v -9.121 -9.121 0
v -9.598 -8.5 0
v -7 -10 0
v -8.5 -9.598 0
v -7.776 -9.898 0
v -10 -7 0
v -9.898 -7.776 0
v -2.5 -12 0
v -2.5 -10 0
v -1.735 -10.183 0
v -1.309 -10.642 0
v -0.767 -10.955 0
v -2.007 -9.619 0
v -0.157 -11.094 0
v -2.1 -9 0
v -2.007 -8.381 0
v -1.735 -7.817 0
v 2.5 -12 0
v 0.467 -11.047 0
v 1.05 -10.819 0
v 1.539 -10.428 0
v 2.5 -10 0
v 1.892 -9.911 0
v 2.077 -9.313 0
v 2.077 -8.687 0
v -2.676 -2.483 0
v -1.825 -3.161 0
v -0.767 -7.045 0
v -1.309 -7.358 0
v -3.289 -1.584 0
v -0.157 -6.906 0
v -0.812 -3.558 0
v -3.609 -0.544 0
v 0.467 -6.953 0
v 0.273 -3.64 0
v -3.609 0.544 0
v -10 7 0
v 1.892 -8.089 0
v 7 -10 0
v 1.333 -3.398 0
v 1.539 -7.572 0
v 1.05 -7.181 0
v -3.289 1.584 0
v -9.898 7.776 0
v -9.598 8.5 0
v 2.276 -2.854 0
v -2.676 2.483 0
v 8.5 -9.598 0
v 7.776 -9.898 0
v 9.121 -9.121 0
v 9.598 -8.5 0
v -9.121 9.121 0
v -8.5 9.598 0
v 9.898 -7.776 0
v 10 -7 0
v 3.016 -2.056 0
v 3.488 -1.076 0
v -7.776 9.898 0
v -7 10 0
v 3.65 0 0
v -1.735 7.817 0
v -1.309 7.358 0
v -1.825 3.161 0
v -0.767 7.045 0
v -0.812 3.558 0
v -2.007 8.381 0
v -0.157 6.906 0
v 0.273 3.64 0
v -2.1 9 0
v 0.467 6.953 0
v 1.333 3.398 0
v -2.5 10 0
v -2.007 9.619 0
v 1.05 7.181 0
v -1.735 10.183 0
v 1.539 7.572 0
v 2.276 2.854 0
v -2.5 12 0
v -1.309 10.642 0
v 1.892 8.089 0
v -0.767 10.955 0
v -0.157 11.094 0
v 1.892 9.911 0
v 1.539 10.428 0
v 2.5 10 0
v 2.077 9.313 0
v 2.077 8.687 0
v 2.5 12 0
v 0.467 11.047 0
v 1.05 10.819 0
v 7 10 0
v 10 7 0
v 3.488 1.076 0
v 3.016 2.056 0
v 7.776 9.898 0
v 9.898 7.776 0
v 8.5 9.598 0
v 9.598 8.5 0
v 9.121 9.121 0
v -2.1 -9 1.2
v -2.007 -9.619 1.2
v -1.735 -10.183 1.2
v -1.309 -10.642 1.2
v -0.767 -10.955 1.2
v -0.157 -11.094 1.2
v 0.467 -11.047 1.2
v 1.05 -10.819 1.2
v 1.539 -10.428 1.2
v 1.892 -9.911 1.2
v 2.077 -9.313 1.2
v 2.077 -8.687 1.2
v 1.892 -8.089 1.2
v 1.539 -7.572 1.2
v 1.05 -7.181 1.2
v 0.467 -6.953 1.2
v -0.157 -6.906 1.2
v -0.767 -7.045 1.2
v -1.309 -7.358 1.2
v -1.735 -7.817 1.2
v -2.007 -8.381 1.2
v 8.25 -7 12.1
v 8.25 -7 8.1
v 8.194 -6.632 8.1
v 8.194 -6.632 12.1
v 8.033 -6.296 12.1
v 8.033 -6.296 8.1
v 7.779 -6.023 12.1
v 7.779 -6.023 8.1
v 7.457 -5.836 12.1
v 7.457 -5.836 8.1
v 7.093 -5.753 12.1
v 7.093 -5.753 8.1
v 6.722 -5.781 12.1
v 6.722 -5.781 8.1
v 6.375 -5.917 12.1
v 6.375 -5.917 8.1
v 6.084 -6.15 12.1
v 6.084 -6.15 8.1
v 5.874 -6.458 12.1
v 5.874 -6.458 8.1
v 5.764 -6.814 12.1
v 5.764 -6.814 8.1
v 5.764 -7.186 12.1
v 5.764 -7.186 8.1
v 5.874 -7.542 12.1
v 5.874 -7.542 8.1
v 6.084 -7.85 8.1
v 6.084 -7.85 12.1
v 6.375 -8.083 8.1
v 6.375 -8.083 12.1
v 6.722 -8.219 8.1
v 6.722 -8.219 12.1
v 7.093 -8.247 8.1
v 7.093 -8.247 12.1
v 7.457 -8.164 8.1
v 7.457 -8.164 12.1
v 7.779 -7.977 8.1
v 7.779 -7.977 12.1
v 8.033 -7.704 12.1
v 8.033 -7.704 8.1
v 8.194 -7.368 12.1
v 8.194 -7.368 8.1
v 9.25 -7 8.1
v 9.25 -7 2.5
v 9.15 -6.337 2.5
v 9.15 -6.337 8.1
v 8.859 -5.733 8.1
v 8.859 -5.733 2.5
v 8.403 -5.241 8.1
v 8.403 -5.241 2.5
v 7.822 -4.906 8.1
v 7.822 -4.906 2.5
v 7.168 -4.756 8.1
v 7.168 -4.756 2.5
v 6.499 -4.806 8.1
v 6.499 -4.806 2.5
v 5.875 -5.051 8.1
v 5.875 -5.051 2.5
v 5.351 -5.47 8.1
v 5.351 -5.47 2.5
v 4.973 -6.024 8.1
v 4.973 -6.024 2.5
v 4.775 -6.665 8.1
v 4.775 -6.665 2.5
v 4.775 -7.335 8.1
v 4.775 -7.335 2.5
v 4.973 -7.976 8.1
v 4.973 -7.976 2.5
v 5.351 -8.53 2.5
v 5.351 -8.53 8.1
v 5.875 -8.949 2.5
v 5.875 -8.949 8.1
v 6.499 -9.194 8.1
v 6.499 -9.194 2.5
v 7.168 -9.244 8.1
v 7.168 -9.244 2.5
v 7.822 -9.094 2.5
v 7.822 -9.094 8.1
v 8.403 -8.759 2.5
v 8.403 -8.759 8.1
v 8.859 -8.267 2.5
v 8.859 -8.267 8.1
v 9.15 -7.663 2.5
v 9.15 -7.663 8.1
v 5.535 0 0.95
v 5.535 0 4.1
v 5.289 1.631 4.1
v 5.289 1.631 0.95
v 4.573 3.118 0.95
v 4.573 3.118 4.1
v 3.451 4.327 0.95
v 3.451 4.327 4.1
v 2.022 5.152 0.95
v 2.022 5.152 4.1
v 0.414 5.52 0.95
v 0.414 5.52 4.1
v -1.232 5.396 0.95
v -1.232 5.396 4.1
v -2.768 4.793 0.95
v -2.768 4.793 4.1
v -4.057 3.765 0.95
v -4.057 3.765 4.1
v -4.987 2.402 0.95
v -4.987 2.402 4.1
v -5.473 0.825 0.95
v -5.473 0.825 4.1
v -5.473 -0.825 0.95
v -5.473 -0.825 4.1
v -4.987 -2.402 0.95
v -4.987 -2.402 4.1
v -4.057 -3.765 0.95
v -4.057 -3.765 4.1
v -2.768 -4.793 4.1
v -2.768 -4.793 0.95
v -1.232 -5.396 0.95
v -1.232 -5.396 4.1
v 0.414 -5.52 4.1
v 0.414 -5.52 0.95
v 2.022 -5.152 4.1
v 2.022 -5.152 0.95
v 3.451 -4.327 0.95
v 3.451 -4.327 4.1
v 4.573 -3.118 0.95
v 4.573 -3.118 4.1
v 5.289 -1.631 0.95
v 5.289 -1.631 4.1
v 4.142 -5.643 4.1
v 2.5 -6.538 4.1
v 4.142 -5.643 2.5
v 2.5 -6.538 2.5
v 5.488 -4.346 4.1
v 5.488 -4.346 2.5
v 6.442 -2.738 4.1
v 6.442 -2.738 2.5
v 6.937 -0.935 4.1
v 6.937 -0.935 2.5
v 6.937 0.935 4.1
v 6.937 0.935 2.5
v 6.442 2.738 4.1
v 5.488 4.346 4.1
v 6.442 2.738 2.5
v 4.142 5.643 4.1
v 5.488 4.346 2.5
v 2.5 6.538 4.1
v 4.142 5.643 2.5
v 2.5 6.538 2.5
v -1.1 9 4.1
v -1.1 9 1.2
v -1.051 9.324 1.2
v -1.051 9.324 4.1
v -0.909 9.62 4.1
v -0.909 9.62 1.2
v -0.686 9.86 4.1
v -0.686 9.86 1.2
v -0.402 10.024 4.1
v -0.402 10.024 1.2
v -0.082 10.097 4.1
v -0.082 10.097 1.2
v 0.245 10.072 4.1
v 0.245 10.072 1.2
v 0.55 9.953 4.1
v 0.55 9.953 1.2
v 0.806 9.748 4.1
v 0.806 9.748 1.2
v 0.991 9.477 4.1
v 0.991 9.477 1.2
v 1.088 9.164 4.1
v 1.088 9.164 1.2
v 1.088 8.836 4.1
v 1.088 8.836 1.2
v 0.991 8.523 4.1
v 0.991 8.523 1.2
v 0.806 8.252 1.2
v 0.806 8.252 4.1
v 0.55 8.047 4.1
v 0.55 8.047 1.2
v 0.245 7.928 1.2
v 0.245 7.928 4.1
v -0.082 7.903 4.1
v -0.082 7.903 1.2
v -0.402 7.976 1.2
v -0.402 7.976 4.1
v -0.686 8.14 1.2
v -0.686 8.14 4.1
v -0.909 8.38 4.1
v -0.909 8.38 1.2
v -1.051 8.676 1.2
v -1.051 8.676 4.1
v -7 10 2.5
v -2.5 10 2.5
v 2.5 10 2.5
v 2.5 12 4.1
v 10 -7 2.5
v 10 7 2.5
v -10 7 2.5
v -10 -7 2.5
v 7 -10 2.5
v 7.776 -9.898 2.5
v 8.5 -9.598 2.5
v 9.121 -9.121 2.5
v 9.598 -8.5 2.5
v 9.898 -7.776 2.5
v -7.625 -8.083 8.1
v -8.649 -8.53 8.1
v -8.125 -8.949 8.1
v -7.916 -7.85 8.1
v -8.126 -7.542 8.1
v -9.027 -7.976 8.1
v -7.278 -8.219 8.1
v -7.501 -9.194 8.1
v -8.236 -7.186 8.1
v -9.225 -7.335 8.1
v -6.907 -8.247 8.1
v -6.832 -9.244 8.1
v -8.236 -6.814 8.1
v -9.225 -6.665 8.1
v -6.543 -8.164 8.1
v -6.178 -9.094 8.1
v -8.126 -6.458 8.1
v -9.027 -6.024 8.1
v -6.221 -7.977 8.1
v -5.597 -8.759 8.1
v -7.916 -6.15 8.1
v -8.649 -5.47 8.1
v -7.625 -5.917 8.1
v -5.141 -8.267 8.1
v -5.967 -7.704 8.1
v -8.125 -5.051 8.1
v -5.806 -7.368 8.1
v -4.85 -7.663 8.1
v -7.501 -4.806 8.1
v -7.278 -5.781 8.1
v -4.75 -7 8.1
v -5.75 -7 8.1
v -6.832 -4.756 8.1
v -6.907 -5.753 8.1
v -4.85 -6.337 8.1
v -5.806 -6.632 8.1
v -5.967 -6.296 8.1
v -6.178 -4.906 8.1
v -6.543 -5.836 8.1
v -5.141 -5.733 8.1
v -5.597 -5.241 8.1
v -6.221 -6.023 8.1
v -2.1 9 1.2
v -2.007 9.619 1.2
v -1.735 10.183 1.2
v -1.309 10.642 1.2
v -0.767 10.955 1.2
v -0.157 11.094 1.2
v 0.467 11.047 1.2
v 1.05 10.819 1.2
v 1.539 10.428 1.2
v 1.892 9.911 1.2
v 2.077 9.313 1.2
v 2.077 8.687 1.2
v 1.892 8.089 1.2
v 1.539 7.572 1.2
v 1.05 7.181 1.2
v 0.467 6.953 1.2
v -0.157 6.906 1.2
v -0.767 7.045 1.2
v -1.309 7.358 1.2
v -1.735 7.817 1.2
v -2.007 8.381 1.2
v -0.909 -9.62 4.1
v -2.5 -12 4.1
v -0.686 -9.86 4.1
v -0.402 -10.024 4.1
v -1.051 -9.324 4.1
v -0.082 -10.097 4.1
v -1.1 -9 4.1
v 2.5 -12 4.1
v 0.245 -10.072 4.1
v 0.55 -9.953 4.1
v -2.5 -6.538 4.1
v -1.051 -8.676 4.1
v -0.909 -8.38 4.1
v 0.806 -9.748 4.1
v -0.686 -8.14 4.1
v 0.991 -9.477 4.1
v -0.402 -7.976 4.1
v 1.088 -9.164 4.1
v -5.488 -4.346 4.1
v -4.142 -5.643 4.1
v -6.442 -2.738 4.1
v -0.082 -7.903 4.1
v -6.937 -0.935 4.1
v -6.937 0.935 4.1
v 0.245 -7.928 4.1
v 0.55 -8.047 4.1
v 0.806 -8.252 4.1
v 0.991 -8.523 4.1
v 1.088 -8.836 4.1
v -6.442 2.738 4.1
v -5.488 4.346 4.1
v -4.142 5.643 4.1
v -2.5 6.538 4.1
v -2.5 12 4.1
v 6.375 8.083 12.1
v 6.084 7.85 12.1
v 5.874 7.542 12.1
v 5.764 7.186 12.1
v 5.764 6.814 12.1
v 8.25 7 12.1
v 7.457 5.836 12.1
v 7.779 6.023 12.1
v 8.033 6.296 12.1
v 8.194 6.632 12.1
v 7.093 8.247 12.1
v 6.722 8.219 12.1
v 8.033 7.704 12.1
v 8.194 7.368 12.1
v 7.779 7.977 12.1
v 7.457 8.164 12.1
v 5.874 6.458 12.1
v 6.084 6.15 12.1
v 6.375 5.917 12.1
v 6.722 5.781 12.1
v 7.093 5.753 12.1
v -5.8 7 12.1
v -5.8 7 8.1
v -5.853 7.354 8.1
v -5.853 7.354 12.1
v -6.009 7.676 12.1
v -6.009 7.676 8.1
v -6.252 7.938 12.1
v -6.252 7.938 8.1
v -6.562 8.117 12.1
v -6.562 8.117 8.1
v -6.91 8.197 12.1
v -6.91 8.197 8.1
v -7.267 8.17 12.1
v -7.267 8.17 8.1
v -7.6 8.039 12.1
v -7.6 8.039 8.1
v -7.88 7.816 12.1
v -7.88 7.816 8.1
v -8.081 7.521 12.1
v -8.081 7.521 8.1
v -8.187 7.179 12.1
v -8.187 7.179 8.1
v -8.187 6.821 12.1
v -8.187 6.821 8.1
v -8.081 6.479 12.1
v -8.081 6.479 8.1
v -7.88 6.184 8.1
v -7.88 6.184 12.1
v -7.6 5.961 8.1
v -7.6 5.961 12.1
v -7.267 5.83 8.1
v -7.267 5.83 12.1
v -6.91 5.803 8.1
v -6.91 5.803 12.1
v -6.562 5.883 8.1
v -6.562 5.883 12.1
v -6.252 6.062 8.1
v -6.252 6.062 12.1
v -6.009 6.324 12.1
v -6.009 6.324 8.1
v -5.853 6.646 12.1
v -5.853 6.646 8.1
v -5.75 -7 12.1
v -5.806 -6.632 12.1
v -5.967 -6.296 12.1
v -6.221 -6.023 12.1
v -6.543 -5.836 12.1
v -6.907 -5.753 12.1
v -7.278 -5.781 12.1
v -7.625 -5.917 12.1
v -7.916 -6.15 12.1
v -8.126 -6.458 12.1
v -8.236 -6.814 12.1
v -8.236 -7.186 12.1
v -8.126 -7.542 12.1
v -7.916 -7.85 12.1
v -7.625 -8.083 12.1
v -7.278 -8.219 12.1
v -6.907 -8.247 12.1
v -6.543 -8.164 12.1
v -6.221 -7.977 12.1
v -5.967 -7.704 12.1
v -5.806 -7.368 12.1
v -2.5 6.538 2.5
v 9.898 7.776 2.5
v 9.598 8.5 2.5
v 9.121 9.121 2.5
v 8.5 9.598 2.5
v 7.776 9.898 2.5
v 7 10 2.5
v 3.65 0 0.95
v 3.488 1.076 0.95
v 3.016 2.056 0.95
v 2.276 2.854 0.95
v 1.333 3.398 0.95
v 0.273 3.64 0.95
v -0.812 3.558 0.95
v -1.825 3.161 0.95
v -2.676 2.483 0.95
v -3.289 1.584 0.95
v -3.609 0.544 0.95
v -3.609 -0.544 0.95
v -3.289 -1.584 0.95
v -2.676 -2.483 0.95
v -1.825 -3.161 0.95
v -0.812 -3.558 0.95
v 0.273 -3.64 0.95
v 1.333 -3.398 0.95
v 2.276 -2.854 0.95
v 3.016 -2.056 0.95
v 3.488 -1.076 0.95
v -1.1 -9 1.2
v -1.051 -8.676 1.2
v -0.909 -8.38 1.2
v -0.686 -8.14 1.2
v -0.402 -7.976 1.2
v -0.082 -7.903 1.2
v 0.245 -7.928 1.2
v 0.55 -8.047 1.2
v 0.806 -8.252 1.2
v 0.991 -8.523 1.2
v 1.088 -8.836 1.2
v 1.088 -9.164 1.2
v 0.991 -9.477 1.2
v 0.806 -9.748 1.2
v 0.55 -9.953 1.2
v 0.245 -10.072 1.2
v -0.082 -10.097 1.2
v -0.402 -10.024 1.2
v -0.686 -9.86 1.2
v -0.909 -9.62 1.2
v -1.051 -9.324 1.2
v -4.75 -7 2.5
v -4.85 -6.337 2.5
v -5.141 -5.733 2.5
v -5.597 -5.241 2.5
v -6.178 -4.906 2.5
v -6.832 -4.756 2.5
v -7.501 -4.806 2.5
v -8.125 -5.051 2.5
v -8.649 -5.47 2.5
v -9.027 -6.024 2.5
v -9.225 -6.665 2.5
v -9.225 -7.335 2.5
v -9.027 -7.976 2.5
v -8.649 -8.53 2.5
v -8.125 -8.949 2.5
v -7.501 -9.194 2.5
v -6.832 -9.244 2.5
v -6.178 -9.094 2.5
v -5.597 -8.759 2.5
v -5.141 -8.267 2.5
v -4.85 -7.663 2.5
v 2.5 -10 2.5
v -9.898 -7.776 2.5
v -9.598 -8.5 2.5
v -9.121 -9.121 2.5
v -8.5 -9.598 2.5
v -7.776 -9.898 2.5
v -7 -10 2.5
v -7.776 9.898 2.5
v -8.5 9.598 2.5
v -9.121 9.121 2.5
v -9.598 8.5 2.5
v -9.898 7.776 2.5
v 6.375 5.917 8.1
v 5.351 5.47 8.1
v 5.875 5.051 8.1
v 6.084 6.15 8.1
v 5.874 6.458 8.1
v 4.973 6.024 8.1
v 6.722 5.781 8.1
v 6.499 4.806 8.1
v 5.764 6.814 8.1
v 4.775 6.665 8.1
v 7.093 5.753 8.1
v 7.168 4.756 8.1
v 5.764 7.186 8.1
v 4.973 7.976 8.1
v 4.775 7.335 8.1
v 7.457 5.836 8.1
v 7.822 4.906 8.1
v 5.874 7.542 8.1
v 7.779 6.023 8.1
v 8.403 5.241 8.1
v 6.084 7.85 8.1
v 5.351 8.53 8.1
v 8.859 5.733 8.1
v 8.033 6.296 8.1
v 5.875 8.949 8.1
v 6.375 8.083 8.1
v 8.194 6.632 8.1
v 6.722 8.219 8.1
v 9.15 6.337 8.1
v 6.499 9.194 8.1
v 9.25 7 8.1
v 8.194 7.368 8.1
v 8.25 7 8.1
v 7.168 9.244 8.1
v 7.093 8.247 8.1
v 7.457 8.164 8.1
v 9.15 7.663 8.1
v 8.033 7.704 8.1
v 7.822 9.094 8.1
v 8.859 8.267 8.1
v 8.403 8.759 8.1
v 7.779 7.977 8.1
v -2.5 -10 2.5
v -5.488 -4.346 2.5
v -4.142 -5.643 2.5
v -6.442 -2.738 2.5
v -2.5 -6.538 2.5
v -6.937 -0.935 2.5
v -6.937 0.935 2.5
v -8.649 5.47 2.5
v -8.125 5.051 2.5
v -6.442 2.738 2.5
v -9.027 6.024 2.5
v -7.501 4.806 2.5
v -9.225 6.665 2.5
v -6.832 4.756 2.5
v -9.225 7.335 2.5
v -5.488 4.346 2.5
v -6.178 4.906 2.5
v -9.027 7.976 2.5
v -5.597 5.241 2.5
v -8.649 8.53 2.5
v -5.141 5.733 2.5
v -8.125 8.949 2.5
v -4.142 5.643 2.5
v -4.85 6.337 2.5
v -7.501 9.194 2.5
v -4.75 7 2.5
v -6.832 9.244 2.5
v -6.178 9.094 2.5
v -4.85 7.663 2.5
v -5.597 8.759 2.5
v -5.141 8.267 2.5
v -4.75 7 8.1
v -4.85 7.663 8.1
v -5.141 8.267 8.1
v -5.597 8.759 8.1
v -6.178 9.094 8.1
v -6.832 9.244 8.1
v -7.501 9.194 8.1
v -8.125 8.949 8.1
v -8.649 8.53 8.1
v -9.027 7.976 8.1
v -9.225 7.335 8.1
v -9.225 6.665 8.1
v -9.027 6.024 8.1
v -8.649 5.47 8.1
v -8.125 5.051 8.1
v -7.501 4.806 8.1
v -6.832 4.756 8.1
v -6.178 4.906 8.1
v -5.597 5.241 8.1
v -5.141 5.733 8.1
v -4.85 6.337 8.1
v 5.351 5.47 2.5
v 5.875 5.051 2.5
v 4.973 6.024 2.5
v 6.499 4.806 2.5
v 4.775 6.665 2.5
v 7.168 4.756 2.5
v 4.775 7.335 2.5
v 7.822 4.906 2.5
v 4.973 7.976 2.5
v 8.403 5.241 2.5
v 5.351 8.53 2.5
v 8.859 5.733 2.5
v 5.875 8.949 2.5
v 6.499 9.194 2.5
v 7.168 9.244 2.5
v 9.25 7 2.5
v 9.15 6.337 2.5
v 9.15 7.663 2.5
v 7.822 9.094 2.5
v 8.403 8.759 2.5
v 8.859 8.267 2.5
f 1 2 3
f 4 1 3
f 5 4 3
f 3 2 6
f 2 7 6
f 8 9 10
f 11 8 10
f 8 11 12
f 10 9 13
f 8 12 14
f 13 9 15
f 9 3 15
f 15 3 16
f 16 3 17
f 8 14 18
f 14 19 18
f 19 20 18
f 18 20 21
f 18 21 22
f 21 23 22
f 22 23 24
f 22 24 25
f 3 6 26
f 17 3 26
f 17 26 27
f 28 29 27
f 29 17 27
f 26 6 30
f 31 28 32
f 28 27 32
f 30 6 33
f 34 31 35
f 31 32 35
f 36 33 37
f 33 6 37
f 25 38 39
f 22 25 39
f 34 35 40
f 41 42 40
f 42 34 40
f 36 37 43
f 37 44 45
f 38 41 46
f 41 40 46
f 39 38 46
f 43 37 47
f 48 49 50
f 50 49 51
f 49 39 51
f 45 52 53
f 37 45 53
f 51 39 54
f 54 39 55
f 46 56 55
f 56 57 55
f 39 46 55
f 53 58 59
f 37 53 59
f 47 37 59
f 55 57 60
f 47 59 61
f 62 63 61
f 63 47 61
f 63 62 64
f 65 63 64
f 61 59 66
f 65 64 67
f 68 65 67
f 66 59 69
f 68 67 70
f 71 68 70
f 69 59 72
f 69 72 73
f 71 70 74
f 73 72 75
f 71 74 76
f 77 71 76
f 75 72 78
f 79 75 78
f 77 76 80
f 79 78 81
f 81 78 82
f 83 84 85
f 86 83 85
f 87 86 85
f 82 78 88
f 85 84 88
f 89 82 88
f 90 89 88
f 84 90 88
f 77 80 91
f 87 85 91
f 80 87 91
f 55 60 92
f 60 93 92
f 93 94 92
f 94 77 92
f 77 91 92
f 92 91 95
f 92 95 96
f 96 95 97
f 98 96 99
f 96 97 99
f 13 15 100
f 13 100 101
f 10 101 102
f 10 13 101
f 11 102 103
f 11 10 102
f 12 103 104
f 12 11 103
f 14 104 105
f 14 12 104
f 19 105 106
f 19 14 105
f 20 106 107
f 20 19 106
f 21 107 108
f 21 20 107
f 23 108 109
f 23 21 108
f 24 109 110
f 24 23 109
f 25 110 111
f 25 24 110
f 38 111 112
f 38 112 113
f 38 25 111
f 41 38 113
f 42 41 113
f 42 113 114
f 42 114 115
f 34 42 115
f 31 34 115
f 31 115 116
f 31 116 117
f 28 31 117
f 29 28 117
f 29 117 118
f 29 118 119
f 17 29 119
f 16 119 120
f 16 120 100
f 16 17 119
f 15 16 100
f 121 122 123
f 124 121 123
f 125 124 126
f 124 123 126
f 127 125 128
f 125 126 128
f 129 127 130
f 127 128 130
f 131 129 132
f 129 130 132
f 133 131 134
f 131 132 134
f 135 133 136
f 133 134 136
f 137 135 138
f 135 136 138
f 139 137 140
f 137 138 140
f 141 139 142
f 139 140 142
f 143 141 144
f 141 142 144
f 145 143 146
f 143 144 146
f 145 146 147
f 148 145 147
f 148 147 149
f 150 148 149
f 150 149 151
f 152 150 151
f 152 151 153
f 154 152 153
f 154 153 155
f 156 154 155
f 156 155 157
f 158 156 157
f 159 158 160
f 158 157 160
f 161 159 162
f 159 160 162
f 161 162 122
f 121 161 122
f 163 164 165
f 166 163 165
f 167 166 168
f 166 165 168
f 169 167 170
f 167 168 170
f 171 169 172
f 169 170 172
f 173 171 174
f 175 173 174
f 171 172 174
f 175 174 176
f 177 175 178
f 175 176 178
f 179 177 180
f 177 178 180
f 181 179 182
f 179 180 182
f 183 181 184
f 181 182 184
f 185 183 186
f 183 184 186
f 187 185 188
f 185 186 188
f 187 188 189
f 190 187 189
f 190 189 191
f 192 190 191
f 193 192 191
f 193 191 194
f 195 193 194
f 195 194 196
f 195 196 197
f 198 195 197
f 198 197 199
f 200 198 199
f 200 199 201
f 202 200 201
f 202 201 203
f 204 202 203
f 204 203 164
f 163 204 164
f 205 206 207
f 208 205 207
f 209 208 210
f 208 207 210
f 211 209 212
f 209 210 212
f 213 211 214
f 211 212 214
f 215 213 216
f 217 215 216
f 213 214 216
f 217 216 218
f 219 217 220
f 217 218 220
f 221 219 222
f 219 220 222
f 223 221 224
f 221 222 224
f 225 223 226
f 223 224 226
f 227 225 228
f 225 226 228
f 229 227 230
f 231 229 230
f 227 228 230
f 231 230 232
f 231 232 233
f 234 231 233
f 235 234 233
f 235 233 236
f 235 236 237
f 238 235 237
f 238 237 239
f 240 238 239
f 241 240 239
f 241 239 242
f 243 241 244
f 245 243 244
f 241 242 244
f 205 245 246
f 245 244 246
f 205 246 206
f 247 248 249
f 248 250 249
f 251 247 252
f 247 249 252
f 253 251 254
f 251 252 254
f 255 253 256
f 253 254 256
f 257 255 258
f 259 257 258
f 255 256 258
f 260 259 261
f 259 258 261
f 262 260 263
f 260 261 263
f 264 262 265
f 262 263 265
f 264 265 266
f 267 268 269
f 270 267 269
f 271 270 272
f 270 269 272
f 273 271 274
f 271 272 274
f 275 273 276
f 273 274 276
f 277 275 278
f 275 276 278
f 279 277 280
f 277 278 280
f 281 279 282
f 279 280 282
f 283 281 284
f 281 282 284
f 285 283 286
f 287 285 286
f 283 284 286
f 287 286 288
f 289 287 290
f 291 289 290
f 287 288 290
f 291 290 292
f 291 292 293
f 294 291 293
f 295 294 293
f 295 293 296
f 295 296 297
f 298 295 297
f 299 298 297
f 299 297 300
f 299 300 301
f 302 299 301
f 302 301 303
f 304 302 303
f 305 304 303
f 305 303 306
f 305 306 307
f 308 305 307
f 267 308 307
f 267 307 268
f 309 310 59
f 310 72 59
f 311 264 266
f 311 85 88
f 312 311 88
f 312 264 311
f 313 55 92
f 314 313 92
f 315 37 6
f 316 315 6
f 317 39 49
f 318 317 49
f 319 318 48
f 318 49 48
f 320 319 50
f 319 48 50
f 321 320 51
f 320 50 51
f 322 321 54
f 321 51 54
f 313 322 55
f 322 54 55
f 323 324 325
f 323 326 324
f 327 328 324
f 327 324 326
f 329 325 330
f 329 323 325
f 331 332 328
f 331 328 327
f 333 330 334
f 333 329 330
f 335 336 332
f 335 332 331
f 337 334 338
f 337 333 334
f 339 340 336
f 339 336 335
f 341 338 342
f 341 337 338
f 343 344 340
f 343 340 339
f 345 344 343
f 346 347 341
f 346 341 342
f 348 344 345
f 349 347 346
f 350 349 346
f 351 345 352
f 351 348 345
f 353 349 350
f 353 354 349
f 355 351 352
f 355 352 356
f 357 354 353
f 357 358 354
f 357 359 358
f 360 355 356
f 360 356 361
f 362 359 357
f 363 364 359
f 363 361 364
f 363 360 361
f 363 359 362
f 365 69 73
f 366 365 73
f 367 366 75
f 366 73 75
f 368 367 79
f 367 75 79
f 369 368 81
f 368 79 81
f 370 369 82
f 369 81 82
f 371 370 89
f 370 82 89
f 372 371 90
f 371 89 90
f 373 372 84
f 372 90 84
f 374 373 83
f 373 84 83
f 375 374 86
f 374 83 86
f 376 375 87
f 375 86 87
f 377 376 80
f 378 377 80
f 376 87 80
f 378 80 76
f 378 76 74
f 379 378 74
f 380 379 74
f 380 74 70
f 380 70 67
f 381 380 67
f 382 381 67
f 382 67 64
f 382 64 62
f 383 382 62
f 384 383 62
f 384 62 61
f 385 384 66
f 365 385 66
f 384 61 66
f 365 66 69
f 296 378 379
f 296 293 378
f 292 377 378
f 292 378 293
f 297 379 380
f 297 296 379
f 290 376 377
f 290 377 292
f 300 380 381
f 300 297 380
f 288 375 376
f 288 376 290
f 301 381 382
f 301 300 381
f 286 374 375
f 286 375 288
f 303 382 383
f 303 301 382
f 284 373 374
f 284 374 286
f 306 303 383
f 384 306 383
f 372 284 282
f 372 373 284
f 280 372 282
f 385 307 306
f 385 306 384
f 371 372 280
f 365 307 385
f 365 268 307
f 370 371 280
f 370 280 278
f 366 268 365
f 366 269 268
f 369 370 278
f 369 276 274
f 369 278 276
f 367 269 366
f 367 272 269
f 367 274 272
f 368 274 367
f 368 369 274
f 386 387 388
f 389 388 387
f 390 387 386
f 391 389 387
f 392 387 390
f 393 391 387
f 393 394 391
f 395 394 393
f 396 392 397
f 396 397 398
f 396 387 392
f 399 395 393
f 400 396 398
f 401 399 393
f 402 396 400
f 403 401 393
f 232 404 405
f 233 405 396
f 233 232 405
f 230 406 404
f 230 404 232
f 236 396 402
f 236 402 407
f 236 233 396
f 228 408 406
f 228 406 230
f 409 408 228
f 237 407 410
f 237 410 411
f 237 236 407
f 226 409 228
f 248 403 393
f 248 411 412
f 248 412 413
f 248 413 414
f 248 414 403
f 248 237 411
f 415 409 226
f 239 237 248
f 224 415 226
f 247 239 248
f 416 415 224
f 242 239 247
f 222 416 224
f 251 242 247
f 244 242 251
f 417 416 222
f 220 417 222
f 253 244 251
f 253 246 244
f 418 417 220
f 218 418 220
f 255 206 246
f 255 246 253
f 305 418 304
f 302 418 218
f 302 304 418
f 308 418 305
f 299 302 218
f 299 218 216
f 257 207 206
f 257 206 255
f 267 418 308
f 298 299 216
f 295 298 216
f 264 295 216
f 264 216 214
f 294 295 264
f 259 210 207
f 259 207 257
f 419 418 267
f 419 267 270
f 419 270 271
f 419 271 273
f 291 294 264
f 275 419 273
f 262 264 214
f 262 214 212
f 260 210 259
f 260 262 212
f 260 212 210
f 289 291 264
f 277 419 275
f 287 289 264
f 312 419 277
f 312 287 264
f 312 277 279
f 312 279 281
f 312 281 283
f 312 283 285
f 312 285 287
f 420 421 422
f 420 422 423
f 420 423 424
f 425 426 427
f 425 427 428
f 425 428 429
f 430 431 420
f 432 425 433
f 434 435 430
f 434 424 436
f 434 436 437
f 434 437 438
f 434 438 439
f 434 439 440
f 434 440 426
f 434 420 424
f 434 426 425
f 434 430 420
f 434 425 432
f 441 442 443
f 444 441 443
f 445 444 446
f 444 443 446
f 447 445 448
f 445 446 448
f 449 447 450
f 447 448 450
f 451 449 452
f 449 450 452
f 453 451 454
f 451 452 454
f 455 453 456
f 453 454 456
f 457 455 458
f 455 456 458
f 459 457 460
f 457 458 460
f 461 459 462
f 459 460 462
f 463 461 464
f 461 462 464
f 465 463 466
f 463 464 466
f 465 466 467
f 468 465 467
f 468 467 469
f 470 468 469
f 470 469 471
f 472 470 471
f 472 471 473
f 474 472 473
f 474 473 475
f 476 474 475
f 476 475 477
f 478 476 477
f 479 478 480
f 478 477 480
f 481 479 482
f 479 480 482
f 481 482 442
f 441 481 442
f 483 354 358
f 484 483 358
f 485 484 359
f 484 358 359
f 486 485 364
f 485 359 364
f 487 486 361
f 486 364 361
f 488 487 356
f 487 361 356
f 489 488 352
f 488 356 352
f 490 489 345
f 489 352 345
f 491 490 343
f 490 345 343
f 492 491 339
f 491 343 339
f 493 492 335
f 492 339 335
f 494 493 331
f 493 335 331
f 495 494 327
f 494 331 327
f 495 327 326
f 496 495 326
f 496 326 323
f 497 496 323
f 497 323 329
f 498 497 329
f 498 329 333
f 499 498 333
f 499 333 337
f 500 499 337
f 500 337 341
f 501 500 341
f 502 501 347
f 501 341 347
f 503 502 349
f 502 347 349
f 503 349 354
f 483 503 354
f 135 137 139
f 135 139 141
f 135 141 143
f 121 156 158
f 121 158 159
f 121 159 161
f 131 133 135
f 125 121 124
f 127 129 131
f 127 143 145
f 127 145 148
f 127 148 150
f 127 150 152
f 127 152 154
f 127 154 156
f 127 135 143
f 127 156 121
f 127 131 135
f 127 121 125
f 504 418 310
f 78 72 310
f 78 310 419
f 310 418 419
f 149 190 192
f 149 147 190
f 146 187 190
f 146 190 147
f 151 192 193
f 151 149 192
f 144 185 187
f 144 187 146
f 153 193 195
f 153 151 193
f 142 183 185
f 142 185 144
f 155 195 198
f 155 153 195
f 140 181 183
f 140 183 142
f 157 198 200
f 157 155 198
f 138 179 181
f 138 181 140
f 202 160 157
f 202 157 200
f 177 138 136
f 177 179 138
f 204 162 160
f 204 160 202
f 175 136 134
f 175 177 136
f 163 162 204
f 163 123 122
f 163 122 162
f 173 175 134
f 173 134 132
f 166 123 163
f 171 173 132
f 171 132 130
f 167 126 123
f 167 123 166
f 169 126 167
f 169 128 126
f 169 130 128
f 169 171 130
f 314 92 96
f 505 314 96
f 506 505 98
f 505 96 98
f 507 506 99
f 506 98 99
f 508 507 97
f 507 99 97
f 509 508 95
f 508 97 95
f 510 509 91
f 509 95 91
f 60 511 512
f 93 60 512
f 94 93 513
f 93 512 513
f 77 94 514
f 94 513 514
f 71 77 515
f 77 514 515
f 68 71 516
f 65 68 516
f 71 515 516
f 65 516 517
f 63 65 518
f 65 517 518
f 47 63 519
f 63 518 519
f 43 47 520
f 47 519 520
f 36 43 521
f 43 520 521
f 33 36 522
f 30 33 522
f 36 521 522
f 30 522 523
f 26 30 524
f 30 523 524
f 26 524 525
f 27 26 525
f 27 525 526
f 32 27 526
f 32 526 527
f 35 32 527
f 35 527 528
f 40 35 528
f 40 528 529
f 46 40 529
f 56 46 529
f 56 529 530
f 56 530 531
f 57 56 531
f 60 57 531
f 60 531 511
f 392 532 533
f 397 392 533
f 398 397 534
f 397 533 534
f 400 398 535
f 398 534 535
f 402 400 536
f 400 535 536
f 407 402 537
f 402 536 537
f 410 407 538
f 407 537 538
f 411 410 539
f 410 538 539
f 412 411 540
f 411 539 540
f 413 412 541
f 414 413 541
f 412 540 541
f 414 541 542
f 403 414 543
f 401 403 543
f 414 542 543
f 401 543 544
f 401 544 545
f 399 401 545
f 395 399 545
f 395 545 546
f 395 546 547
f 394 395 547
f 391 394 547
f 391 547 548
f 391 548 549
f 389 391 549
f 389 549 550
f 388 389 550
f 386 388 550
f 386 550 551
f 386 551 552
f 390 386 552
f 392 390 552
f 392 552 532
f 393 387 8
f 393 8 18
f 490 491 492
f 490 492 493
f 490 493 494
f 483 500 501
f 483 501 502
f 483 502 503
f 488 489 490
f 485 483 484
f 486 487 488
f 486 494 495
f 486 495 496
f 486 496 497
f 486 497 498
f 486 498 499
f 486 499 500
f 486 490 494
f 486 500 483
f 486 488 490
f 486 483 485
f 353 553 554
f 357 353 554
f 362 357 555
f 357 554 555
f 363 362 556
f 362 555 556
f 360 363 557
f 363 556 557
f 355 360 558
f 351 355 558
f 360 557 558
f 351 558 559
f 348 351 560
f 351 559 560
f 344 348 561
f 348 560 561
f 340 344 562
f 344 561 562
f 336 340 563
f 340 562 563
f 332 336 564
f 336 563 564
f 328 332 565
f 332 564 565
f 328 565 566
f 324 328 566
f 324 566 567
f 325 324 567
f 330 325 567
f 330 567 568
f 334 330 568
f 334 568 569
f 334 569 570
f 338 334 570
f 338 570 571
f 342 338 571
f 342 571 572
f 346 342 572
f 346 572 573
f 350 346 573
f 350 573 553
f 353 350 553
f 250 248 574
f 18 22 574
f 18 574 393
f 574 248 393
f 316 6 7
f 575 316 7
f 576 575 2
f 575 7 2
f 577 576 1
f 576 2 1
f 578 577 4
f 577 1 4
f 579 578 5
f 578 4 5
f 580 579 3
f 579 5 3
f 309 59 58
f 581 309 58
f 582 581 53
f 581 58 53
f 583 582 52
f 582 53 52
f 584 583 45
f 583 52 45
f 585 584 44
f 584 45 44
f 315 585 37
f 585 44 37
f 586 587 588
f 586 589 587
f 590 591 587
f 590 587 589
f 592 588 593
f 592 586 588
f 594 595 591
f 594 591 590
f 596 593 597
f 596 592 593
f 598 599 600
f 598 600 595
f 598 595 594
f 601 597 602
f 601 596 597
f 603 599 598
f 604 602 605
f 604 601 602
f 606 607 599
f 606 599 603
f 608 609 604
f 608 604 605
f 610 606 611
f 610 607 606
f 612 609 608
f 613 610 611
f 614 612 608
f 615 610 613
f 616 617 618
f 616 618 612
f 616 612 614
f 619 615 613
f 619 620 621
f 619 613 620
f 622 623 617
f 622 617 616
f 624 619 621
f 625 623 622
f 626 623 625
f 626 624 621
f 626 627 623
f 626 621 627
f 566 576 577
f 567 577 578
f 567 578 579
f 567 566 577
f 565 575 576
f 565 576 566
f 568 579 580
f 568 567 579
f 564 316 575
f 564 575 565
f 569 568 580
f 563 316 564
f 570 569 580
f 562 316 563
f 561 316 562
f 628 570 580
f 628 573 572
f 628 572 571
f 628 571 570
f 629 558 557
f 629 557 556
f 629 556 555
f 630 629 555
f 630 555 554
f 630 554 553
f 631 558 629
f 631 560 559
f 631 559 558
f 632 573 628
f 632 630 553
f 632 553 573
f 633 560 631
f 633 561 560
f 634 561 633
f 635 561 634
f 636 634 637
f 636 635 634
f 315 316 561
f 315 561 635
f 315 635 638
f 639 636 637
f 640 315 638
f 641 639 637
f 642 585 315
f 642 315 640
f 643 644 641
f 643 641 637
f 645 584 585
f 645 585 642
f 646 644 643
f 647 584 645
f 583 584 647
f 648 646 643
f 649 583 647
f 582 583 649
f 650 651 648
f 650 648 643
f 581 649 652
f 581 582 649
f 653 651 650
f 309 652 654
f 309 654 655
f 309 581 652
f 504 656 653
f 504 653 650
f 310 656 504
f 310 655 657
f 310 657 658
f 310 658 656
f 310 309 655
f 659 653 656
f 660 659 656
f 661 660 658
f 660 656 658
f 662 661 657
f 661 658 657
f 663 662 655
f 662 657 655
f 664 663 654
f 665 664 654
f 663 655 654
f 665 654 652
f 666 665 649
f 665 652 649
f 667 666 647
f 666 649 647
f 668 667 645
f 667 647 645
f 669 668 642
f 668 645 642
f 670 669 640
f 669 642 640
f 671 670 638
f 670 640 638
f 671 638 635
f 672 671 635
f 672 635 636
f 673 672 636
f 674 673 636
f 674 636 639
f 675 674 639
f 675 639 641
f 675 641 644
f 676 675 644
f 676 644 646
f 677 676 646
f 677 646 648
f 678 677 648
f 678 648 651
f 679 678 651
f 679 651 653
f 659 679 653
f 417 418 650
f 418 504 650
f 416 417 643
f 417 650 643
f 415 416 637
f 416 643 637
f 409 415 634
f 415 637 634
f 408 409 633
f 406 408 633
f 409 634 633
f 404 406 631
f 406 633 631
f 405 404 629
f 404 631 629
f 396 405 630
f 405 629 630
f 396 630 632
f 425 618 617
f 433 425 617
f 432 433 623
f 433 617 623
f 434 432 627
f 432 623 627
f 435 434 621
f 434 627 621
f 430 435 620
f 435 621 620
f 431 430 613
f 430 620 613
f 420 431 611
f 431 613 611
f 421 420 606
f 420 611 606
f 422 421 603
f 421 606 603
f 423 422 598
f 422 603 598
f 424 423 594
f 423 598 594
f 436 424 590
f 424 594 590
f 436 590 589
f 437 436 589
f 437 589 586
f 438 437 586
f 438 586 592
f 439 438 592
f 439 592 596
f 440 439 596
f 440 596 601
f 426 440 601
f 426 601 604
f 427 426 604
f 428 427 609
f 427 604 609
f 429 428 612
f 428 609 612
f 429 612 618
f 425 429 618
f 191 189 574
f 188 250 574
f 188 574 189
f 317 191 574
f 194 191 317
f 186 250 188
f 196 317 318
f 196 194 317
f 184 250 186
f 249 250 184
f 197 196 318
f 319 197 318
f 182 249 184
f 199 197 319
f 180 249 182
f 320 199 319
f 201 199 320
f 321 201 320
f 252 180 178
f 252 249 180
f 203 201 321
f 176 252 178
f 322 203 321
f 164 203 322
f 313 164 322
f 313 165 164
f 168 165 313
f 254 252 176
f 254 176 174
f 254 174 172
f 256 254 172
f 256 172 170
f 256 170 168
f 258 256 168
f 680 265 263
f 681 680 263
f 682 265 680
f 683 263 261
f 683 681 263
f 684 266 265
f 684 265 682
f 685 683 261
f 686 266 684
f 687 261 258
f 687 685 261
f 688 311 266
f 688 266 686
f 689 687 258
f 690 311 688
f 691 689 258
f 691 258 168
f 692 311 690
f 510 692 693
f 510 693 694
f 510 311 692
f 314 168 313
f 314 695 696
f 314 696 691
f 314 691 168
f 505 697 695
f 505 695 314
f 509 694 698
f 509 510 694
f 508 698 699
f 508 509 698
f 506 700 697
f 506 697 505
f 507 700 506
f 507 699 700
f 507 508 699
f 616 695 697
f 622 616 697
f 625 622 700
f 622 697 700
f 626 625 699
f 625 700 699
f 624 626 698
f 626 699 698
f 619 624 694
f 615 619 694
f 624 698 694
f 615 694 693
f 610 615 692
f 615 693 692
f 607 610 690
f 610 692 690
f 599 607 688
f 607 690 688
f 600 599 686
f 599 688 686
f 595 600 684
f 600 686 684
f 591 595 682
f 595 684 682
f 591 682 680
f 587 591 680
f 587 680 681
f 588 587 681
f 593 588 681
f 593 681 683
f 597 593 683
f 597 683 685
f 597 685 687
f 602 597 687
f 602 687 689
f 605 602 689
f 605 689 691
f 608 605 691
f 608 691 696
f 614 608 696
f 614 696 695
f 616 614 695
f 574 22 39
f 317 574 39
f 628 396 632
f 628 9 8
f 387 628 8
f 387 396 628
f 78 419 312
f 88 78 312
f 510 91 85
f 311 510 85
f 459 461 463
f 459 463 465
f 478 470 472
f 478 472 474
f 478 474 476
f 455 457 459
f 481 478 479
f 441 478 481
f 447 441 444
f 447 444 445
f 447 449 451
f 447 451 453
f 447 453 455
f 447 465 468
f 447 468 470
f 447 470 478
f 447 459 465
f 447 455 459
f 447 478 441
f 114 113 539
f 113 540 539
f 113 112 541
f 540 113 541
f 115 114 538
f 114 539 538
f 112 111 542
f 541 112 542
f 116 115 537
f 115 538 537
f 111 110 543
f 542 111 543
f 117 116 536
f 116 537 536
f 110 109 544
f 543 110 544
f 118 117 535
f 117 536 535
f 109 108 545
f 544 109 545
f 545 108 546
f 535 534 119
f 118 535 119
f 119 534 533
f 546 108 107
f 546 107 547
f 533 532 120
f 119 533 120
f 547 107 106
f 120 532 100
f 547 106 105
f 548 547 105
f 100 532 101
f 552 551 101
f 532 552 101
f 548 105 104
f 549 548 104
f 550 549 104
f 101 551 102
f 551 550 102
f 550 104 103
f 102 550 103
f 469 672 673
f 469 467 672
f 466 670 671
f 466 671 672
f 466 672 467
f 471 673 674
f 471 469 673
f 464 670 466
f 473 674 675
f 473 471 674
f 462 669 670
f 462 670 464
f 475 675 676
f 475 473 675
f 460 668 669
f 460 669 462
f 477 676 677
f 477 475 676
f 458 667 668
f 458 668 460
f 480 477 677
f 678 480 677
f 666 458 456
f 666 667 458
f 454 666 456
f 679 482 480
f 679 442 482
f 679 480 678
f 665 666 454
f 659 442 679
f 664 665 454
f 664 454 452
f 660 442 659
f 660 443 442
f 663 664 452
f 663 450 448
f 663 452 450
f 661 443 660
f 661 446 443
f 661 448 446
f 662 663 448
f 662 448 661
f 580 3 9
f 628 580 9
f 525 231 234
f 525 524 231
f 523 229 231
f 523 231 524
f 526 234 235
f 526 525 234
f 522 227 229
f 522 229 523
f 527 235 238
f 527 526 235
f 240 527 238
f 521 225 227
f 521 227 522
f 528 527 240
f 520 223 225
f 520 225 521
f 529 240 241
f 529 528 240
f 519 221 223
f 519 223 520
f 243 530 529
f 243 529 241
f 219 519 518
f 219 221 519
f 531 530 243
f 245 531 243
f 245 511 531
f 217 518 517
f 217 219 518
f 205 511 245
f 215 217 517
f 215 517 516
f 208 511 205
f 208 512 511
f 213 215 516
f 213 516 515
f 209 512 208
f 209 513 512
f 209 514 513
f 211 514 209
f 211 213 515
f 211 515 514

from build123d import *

# Parameters (mm, degrees)
EXTRUDE_1_DEPTH     = 1.5
SKETCH_4_R          = 2.25
EXTRUDE_2_DEPTH     = 6.6
SKETCH_5_R          = 1.2
SKETCH_5_R_2        = 1.25
EXTRUDE_3_DEPTH     = 4
SKETCH_6_R          = 7
EXTRUDE_4_DEPTH     = 2.6
SKETCH_7_R          = 5.535
CUT_EXTRUDE_1_DEPTH = 3.15
SKETCH_8_R          = 3.65
CUT_EXTRUDE_2_DEPTH = 5.65
EXTRUDE_6_REACH     = 18.248
SKETCH_11_W         = 5
SKETCH_11_H         = 5.997078986
SKETCH_12_R         = 2.1
CUT_EXTRUDE_5_DEPTH = 1.2
SKETCH_13_R         = 1.1
CUT_EXTRUDE_6_DEPTH = 26.5
EXTRUDE_7_DEPTH     = 1


with BuildPart() as part:
    # 草图1 → 凸台-拉伸1 (new body)
    with BuildSketch(Plane.XY):
        with BuildLine():
            Line((-7, -10), (7, -10))
            ThreePointArc((7, -10), (9.121320344, -9.121320344), (10, -7))
            Line((10, -7), (10, 7))
            ThreePointArc((10, 7), (9.121320344, 9.121320344), (7, 10))
            Line((7, 10), (-7, 10))
            ThreePointArc((-7, 10), (-9.121320344, 9.121320344), (-10, 7))
            Line((-10, 7), (-10, -7))
            ThreePointArc((-10, -7), (-9.121320344, -9.121320344), (-7, -10))
        make_face()
    extrude(amount=EXTRUDE_1_DEPTH)

    # 草图4 → 凸台-拉伸2 (add)
    with BuildSketch(Plane.XY.offset(1.5)):
        with Locations((-7, -7)):
            Circle(SKETCH_4_R)
        with Locations((7, -7)):
            Circle(SKETCH_4_R)
        with Locations((7, 7)):
            Circle(SKETCH_4_R)
        with Locations((-7, 7)):
            Circle(SKETCH_4_R)
    extrude(amount=EXTRUDE_2_DEPTH)

    # 草图5 → 凸台-拉伸3 (add)
    with BuildSketch(Plane.XY.offset(8.1)):
        with Locations((-7, 7)):
            Circle(SKETCH_5_R)
        with Locations((-7, -7)):
            Circle(SKETCH_5_R_2)
        with Locations((7, -7)):
            Circle(SKETCH_5_R_2)
        with Locations((7, 7)):
            Circle(SKETCH_5_R_2)
    extrude(amount=EXTRUDE_3_DEPTH)

    # 草图6 → 凸台-拉伸4 (add)
    with BuildSketch(Plane.XY.offset(1.5)):
        Circle(SKETCH_6_R)
    extrude(amount=EXTRUDE_4_DEPTH)

    # 草图7 → 切除-拉伸1 (cut)
    with BuildSketch(Plane.XY.offset(4.1)):
        Circle(SKETCH_7_R)
    extrude(amount=-CUT_EXTRUDE_1_DEPTH, mode=Mode.SUBTRACT)

    # 草图8 → 切除-拉伸2 (cut)
    with BuildSketch(Plane.XY.offset(0.95)):
        Circle(SKETCH_8_R)
    extrude(amount=-CUT_EXTRUDE_2_DEPTH, mode=Mode.SUBTRACT)

    # 凸台-拉伸6: up to this face of the body (flat: up to its plane)
    extrude_6_end = Plane(part.part.faces().sort_by_distance((0, -9.717157288, 0))[0])
    # 草图11 → 凸台-拉伸6 (add, up to the picked face)
    with BuildSketch(Plane.XY.offset(4.1), mode=Mode.PRIVATE) as extrude_6_sk1:
        with Locations((0, 9.001460507)):
            Rectangle(SKETCH_11_W, SKETCH_11_H)
    extrude_6_tool1 = split(extrude(extrude_6_sk1.sketch, amount=-EXTRUDE_6_REACH, mode=Mode.PRIVATE), bisect_by=extrude_6_end, keep=Keep.BOTH, mode=Mode.PRIVATE)
    extrude_6 = extrude_6_tool1.solids().sort_by(Axis((0, 9.001461, 4.1), (0, 0, -1)))[0]
    add(extrude_6)

    # 草图12 → 切除-拉伸5 (cut)
    with BuildSketch(Plane(origin=(0, 0, 0), x_dir=(-1, 0, 0), z_dir=(0, 0, -1))):
        with Locations((0, 9)):
            Circle(SKETCH_12_R)
    cut_extrude_5 = extrude(amount=-CUT_EXTRUDE_5_DEPTH, mode=Mode.SUBTRACT)

    # 镜向1: 凸台-拉伸6, 切除-拉伸5 across plane
    add(extrude_6.mirror(Plane.ZX))
    add(cut_extrude_5.mirror(Plane.ZX), mode=Mode.SUBTRACT)

    # 草图13 → 切除-拉伸6 (cut)
    with BuildSketch(Plane(origin=(0, 0, 1.2), x_dir=(-1, 0, 0), z_dir=(0, 0, -1))):
        with Locations((0, 9)):
            Circle(SKETCH_13_R)
        with Locations((0, -9)):
            Circle(SKETCH_13_R)
    extrude(amount=-CUT_EXTRUDE_6_DEPTH, mode=Mode.SUBTRACT)

    # 草图14 → 凸台-拉伸7 (add)
    with BuildSketch(Plane.XY.offset(1.5)):
        with BuildLine():
            Line((-7, -10), (-2.5, -10))
            Line((-2.5, -10), (-2.5, -6.538348415))
            ThreePointArc((-2.5, -6.538348415), (-7, 0), (-2.5, 6.538348415))
            Line((-2.5, 6.538348415), (-2.5, 10))
            Line((-2.5, 10), (-7, 10))
            ThreePointArc((-7, 10), (-9.121320344, 9.121320344), (-10, 7))
            Line((-10, 7), (-10, -7))
            ThreePointArc((-10, -7), (-9.121320344, -9.121320344), (-7, -10))
        make_face()
        with BuildLine():
            Line((2.5, -6.538348415), (2.5, -10))
            Line((2.5, -10), (7, -10))
            ThreePointArc((7, -10), (9.121320344, -9.121320344), (10, -7))
            Line((10, -7), (10, 7))
            ThreePointArc((10, 7), (9.121320344, 9.121320344), (7, 10))
            Line((7, 10), (2.5, 10))
            Line((2.5, 10), (2.5, 6.538348415))
            ThreePointArc((2.5, 6.538348415), (7, 0), (2.5, -6.538348415))
        make_face()
    extrude(amount=EXTRUDE_7_DEPTH)


solid = part.part
